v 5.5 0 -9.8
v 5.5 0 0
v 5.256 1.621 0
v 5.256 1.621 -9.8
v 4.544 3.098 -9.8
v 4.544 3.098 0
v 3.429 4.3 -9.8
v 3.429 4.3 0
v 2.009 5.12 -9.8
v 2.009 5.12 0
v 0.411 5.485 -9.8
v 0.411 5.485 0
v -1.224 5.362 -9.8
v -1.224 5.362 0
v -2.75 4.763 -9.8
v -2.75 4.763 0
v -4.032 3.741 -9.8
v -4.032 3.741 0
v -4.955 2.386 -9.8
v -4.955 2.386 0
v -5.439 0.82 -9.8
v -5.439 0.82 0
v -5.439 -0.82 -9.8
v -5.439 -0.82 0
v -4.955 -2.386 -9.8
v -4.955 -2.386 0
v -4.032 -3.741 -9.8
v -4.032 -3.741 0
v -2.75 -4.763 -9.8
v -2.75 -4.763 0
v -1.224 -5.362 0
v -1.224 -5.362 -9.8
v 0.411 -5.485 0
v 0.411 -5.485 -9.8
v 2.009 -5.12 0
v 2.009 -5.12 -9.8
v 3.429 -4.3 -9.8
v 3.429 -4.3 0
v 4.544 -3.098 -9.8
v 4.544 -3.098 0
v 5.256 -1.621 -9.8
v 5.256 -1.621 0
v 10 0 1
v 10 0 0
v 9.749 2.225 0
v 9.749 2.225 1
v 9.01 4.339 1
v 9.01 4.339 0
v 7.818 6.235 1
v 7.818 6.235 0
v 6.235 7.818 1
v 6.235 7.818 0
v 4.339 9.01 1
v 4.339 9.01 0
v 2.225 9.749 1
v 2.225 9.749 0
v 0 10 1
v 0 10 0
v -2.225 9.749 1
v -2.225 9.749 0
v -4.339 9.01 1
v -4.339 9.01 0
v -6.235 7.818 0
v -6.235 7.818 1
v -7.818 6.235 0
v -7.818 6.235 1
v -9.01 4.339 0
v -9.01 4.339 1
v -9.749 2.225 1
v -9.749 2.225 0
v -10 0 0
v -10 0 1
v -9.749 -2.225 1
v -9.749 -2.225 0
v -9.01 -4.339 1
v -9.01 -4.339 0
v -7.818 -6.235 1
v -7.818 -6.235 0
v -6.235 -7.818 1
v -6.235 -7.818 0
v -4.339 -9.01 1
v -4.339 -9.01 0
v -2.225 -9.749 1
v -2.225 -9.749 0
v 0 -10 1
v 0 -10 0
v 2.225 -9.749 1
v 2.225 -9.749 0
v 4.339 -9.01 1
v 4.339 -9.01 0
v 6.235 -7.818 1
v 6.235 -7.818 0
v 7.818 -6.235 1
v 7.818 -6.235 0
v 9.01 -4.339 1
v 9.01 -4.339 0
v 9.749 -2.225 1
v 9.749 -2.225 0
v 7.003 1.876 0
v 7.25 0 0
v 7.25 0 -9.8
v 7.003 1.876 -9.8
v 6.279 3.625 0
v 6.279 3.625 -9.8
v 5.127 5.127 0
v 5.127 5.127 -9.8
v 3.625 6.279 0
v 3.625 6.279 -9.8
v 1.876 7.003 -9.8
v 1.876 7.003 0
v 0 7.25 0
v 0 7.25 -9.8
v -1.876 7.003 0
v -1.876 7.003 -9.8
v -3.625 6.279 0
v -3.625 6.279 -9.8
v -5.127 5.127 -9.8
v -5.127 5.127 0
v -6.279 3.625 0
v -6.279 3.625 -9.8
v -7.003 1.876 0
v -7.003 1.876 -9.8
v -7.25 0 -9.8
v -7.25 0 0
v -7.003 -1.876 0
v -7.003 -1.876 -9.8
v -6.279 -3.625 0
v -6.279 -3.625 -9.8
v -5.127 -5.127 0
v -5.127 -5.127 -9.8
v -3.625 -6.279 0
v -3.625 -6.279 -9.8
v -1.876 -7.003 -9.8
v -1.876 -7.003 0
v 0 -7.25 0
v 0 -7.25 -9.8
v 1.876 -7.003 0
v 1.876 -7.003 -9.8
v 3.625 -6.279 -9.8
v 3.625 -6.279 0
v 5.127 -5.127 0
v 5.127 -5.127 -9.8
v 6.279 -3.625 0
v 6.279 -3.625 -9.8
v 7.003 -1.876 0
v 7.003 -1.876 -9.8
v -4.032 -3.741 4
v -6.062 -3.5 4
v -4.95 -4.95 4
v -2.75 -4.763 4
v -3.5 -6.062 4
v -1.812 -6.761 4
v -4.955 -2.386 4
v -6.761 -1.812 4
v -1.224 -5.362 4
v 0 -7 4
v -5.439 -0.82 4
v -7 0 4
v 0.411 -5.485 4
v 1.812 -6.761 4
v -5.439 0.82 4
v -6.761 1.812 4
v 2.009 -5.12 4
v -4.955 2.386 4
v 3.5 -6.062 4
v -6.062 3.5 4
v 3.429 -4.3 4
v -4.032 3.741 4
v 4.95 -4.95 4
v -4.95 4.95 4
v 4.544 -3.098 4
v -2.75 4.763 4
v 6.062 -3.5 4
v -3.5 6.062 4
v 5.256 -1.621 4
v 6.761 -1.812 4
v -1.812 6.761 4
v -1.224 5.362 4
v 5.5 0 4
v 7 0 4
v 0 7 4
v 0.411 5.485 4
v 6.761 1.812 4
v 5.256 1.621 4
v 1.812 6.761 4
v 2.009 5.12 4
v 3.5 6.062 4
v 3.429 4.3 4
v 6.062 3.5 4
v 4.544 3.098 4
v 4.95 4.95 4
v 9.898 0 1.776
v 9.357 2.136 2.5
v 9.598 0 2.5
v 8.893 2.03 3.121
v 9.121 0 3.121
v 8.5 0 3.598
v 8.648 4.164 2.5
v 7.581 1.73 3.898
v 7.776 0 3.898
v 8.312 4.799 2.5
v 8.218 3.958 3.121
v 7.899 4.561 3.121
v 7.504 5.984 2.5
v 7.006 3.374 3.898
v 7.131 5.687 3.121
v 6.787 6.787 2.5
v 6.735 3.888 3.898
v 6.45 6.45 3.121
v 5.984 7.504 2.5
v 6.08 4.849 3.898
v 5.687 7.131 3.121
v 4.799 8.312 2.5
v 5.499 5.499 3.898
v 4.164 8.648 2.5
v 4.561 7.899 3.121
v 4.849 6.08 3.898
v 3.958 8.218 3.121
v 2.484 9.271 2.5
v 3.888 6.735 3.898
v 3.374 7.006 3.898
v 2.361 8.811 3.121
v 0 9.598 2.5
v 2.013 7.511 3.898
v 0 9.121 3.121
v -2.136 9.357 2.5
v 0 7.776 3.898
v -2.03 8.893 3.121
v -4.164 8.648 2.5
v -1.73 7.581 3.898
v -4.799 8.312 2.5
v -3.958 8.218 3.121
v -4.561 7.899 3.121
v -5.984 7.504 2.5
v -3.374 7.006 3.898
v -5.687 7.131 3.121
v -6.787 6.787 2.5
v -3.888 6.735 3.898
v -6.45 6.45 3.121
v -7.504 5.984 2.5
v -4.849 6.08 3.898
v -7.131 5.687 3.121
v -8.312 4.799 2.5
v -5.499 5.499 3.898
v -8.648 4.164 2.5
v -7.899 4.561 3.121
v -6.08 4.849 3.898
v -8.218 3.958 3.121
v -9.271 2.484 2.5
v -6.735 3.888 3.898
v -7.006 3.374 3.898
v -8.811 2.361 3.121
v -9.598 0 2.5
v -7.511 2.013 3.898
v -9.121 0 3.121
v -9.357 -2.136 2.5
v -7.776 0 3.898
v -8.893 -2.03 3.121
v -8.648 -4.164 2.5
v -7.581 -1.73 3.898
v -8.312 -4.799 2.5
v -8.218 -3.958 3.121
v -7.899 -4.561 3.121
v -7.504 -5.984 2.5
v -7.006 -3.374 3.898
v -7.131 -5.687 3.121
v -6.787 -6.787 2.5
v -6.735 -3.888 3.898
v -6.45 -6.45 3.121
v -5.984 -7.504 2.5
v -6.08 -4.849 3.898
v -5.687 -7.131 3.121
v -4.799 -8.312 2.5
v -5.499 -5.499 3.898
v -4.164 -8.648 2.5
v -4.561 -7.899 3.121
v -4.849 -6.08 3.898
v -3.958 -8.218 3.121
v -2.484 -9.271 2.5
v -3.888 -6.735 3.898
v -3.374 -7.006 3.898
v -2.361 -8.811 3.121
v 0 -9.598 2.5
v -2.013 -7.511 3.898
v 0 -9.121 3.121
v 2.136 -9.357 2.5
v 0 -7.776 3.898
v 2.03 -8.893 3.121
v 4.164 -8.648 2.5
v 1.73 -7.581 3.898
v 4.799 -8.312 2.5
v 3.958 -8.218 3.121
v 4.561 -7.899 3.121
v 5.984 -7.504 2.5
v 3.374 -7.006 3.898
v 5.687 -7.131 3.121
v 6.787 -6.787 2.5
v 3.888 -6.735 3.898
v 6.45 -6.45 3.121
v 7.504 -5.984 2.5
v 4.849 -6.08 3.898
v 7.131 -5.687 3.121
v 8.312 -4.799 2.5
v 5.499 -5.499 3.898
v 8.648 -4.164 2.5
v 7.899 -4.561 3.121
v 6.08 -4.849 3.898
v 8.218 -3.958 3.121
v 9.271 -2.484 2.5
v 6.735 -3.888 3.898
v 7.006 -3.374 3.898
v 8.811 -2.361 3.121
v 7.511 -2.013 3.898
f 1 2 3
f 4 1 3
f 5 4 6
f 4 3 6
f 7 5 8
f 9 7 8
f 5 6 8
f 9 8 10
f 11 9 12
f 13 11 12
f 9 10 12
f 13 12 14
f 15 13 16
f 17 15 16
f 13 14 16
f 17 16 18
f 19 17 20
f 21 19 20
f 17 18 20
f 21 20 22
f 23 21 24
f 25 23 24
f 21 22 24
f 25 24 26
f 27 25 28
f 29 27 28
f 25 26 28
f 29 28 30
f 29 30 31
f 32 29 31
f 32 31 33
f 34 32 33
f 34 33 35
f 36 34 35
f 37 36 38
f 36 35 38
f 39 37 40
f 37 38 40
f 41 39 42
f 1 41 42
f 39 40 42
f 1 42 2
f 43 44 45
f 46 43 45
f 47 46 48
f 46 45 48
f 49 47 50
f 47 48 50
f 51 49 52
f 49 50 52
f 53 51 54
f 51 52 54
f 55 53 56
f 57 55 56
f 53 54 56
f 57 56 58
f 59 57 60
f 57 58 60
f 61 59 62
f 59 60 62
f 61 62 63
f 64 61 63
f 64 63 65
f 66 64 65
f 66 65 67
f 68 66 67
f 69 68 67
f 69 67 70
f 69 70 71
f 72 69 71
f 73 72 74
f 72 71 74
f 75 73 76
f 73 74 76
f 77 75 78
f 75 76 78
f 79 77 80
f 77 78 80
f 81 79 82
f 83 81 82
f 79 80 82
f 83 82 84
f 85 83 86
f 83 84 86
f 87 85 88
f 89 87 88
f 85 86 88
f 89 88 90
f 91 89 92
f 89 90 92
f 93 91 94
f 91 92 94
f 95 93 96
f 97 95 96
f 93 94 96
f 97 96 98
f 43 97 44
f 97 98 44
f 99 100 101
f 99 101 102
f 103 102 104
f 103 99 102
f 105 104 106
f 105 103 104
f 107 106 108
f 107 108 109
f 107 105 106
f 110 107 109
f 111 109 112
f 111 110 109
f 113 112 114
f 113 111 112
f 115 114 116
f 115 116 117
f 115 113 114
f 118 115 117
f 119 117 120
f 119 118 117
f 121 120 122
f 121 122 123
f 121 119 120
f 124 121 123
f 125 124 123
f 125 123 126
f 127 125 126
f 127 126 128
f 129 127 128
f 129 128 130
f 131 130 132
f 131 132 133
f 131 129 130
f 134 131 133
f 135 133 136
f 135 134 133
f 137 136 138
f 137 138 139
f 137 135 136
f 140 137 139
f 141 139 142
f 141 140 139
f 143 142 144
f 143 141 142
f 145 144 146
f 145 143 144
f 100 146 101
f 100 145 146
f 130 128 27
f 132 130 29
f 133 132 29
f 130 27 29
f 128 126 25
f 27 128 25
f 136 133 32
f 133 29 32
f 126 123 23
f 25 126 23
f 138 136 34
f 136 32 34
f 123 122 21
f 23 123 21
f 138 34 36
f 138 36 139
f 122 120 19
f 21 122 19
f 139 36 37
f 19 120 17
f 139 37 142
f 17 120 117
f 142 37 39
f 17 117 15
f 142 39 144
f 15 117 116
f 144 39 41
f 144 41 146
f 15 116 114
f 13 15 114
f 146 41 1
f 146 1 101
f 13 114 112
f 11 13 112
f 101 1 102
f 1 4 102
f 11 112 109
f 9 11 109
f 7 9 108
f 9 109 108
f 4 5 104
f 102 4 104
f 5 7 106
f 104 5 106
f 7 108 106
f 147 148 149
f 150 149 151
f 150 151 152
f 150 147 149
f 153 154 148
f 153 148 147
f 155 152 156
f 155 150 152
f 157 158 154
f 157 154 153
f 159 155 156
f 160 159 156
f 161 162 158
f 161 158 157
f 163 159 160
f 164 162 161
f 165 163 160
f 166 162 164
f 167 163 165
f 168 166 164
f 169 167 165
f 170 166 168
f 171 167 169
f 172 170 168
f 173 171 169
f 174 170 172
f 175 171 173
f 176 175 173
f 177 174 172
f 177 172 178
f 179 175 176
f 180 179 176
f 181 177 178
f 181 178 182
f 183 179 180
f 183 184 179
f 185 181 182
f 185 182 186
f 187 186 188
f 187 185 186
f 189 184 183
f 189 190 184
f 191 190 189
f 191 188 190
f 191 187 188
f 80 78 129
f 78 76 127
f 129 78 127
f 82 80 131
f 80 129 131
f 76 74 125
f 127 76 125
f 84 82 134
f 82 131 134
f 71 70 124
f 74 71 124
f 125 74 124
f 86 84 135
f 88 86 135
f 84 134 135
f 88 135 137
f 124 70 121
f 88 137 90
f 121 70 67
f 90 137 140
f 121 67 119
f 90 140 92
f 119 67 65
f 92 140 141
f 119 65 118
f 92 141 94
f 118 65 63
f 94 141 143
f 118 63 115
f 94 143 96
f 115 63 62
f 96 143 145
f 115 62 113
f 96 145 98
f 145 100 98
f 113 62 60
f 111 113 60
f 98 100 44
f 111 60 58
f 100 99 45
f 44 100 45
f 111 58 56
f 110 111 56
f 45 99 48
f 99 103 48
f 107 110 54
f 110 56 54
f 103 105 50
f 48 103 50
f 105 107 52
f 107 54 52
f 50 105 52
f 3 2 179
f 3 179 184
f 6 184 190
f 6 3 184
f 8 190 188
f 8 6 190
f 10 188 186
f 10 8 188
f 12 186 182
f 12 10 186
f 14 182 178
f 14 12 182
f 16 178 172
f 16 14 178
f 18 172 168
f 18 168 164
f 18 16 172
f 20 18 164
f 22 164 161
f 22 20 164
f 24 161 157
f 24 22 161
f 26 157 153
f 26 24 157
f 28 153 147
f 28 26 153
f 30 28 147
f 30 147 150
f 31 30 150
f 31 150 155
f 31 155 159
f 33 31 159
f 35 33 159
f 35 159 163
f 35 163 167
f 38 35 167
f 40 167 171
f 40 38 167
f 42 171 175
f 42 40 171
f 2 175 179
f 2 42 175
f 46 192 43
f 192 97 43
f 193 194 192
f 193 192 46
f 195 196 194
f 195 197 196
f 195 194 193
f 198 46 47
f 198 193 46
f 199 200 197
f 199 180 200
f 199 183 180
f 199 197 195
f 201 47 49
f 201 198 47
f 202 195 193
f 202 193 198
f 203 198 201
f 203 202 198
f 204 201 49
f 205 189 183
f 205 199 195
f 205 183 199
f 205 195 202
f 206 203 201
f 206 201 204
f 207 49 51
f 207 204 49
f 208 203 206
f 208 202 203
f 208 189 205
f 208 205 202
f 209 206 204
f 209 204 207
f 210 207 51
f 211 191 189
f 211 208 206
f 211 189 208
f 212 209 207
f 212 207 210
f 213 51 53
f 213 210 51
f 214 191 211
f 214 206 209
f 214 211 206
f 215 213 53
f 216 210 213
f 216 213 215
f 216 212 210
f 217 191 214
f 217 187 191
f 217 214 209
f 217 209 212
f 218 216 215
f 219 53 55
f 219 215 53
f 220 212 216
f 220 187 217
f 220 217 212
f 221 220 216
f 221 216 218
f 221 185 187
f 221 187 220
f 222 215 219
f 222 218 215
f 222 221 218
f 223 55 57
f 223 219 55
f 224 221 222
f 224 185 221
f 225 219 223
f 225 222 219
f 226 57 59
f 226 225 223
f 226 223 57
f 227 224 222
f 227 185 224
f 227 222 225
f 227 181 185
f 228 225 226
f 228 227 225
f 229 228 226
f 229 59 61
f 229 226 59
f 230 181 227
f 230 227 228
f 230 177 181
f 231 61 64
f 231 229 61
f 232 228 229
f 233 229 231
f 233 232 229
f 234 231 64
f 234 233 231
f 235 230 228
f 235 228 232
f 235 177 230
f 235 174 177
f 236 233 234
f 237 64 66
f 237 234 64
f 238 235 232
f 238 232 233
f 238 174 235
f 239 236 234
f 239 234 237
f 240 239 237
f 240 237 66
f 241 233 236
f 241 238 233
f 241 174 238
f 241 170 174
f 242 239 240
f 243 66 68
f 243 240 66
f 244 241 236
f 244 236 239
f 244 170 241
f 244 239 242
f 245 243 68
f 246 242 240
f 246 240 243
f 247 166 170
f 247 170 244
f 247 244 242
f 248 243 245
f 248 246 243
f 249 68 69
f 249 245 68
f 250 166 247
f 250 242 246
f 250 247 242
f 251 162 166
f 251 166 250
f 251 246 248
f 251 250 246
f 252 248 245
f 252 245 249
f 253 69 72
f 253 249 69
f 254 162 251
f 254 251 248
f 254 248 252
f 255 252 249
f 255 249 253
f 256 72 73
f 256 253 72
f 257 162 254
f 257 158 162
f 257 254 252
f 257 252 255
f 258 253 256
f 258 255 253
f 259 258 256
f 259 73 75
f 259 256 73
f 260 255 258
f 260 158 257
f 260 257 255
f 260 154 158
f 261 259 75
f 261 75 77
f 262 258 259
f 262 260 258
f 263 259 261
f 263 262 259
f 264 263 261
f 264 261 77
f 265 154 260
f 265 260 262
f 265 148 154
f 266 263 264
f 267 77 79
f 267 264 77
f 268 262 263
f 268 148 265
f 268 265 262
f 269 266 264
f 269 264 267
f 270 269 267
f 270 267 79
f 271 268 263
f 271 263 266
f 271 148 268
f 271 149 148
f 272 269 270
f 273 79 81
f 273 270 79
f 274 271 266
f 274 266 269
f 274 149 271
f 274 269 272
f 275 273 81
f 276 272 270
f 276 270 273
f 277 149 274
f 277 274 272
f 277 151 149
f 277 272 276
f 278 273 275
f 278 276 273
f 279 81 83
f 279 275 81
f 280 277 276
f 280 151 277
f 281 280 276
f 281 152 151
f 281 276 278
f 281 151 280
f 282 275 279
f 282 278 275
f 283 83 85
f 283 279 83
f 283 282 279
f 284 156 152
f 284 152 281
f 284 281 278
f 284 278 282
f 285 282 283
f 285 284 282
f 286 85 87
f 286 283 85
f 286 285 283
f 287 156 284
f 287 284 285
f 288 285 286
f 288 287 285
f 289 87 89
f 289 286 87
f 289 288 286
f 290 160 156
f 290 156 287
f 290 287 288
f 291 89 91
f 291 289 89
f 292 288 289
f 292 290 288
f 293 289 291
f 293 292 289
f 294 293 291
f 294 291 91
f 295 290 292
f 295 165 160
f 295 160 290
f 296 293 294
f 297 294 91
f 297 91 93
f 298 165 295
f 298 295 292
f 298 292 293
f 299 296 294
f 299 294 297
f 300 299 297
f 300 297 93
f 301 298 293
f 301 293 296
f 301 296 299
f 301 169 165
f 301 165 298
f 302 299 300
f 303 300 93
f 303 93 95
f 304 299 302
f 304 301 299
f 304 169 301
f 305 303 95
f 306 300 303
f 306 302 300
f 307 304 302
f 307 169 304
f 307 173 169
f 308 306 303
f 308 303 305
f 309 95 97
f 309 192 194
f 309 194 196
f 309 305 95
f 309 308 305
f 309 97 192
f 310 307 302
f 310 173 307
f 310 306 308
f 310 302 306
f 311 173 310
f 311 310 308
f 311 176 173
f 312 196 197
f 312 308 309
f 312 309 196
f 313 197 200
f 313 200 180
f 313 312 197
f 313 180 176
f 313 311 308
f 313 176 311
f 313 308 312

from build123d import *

# Parameters (mm, degrees)
F0_R     = 10
F0_R_2   = 7.25
F0_R_3   = 5.5
F1_DEPTH = 4
F2_R     = 3
F3_DEPTH = 9.8


with BuildPart() as f1:
    # F0 (on Top) → F1 (new body)
    with BuildSketch(Plane.XY):
        Circle(F0_R)
        Circle(F0_R_2, mode=Mode.SUBTRACT)
        Circle(F0_R_2)
        Circle(F0_R_3, mode=Mode.SUBTRACT)
    extrude(amount=F1_DEPTH)

    # F2
    f2_edges = [f1.edges().sort_by_distance(p)[0] for p in [
        (-10, 0, 4),
    ]]
    fillet(f2_edges, radius=F2_R)

    # F0 (on Top) → F3 (join)
    with BuildSketch(Plane.XY):
        Circle(F0_R_2)
        Circle(F0_R_3, mode=Mode.SUBTRACT)
    extrude(amount=-F3_DEPTH)


solid = f1.part
